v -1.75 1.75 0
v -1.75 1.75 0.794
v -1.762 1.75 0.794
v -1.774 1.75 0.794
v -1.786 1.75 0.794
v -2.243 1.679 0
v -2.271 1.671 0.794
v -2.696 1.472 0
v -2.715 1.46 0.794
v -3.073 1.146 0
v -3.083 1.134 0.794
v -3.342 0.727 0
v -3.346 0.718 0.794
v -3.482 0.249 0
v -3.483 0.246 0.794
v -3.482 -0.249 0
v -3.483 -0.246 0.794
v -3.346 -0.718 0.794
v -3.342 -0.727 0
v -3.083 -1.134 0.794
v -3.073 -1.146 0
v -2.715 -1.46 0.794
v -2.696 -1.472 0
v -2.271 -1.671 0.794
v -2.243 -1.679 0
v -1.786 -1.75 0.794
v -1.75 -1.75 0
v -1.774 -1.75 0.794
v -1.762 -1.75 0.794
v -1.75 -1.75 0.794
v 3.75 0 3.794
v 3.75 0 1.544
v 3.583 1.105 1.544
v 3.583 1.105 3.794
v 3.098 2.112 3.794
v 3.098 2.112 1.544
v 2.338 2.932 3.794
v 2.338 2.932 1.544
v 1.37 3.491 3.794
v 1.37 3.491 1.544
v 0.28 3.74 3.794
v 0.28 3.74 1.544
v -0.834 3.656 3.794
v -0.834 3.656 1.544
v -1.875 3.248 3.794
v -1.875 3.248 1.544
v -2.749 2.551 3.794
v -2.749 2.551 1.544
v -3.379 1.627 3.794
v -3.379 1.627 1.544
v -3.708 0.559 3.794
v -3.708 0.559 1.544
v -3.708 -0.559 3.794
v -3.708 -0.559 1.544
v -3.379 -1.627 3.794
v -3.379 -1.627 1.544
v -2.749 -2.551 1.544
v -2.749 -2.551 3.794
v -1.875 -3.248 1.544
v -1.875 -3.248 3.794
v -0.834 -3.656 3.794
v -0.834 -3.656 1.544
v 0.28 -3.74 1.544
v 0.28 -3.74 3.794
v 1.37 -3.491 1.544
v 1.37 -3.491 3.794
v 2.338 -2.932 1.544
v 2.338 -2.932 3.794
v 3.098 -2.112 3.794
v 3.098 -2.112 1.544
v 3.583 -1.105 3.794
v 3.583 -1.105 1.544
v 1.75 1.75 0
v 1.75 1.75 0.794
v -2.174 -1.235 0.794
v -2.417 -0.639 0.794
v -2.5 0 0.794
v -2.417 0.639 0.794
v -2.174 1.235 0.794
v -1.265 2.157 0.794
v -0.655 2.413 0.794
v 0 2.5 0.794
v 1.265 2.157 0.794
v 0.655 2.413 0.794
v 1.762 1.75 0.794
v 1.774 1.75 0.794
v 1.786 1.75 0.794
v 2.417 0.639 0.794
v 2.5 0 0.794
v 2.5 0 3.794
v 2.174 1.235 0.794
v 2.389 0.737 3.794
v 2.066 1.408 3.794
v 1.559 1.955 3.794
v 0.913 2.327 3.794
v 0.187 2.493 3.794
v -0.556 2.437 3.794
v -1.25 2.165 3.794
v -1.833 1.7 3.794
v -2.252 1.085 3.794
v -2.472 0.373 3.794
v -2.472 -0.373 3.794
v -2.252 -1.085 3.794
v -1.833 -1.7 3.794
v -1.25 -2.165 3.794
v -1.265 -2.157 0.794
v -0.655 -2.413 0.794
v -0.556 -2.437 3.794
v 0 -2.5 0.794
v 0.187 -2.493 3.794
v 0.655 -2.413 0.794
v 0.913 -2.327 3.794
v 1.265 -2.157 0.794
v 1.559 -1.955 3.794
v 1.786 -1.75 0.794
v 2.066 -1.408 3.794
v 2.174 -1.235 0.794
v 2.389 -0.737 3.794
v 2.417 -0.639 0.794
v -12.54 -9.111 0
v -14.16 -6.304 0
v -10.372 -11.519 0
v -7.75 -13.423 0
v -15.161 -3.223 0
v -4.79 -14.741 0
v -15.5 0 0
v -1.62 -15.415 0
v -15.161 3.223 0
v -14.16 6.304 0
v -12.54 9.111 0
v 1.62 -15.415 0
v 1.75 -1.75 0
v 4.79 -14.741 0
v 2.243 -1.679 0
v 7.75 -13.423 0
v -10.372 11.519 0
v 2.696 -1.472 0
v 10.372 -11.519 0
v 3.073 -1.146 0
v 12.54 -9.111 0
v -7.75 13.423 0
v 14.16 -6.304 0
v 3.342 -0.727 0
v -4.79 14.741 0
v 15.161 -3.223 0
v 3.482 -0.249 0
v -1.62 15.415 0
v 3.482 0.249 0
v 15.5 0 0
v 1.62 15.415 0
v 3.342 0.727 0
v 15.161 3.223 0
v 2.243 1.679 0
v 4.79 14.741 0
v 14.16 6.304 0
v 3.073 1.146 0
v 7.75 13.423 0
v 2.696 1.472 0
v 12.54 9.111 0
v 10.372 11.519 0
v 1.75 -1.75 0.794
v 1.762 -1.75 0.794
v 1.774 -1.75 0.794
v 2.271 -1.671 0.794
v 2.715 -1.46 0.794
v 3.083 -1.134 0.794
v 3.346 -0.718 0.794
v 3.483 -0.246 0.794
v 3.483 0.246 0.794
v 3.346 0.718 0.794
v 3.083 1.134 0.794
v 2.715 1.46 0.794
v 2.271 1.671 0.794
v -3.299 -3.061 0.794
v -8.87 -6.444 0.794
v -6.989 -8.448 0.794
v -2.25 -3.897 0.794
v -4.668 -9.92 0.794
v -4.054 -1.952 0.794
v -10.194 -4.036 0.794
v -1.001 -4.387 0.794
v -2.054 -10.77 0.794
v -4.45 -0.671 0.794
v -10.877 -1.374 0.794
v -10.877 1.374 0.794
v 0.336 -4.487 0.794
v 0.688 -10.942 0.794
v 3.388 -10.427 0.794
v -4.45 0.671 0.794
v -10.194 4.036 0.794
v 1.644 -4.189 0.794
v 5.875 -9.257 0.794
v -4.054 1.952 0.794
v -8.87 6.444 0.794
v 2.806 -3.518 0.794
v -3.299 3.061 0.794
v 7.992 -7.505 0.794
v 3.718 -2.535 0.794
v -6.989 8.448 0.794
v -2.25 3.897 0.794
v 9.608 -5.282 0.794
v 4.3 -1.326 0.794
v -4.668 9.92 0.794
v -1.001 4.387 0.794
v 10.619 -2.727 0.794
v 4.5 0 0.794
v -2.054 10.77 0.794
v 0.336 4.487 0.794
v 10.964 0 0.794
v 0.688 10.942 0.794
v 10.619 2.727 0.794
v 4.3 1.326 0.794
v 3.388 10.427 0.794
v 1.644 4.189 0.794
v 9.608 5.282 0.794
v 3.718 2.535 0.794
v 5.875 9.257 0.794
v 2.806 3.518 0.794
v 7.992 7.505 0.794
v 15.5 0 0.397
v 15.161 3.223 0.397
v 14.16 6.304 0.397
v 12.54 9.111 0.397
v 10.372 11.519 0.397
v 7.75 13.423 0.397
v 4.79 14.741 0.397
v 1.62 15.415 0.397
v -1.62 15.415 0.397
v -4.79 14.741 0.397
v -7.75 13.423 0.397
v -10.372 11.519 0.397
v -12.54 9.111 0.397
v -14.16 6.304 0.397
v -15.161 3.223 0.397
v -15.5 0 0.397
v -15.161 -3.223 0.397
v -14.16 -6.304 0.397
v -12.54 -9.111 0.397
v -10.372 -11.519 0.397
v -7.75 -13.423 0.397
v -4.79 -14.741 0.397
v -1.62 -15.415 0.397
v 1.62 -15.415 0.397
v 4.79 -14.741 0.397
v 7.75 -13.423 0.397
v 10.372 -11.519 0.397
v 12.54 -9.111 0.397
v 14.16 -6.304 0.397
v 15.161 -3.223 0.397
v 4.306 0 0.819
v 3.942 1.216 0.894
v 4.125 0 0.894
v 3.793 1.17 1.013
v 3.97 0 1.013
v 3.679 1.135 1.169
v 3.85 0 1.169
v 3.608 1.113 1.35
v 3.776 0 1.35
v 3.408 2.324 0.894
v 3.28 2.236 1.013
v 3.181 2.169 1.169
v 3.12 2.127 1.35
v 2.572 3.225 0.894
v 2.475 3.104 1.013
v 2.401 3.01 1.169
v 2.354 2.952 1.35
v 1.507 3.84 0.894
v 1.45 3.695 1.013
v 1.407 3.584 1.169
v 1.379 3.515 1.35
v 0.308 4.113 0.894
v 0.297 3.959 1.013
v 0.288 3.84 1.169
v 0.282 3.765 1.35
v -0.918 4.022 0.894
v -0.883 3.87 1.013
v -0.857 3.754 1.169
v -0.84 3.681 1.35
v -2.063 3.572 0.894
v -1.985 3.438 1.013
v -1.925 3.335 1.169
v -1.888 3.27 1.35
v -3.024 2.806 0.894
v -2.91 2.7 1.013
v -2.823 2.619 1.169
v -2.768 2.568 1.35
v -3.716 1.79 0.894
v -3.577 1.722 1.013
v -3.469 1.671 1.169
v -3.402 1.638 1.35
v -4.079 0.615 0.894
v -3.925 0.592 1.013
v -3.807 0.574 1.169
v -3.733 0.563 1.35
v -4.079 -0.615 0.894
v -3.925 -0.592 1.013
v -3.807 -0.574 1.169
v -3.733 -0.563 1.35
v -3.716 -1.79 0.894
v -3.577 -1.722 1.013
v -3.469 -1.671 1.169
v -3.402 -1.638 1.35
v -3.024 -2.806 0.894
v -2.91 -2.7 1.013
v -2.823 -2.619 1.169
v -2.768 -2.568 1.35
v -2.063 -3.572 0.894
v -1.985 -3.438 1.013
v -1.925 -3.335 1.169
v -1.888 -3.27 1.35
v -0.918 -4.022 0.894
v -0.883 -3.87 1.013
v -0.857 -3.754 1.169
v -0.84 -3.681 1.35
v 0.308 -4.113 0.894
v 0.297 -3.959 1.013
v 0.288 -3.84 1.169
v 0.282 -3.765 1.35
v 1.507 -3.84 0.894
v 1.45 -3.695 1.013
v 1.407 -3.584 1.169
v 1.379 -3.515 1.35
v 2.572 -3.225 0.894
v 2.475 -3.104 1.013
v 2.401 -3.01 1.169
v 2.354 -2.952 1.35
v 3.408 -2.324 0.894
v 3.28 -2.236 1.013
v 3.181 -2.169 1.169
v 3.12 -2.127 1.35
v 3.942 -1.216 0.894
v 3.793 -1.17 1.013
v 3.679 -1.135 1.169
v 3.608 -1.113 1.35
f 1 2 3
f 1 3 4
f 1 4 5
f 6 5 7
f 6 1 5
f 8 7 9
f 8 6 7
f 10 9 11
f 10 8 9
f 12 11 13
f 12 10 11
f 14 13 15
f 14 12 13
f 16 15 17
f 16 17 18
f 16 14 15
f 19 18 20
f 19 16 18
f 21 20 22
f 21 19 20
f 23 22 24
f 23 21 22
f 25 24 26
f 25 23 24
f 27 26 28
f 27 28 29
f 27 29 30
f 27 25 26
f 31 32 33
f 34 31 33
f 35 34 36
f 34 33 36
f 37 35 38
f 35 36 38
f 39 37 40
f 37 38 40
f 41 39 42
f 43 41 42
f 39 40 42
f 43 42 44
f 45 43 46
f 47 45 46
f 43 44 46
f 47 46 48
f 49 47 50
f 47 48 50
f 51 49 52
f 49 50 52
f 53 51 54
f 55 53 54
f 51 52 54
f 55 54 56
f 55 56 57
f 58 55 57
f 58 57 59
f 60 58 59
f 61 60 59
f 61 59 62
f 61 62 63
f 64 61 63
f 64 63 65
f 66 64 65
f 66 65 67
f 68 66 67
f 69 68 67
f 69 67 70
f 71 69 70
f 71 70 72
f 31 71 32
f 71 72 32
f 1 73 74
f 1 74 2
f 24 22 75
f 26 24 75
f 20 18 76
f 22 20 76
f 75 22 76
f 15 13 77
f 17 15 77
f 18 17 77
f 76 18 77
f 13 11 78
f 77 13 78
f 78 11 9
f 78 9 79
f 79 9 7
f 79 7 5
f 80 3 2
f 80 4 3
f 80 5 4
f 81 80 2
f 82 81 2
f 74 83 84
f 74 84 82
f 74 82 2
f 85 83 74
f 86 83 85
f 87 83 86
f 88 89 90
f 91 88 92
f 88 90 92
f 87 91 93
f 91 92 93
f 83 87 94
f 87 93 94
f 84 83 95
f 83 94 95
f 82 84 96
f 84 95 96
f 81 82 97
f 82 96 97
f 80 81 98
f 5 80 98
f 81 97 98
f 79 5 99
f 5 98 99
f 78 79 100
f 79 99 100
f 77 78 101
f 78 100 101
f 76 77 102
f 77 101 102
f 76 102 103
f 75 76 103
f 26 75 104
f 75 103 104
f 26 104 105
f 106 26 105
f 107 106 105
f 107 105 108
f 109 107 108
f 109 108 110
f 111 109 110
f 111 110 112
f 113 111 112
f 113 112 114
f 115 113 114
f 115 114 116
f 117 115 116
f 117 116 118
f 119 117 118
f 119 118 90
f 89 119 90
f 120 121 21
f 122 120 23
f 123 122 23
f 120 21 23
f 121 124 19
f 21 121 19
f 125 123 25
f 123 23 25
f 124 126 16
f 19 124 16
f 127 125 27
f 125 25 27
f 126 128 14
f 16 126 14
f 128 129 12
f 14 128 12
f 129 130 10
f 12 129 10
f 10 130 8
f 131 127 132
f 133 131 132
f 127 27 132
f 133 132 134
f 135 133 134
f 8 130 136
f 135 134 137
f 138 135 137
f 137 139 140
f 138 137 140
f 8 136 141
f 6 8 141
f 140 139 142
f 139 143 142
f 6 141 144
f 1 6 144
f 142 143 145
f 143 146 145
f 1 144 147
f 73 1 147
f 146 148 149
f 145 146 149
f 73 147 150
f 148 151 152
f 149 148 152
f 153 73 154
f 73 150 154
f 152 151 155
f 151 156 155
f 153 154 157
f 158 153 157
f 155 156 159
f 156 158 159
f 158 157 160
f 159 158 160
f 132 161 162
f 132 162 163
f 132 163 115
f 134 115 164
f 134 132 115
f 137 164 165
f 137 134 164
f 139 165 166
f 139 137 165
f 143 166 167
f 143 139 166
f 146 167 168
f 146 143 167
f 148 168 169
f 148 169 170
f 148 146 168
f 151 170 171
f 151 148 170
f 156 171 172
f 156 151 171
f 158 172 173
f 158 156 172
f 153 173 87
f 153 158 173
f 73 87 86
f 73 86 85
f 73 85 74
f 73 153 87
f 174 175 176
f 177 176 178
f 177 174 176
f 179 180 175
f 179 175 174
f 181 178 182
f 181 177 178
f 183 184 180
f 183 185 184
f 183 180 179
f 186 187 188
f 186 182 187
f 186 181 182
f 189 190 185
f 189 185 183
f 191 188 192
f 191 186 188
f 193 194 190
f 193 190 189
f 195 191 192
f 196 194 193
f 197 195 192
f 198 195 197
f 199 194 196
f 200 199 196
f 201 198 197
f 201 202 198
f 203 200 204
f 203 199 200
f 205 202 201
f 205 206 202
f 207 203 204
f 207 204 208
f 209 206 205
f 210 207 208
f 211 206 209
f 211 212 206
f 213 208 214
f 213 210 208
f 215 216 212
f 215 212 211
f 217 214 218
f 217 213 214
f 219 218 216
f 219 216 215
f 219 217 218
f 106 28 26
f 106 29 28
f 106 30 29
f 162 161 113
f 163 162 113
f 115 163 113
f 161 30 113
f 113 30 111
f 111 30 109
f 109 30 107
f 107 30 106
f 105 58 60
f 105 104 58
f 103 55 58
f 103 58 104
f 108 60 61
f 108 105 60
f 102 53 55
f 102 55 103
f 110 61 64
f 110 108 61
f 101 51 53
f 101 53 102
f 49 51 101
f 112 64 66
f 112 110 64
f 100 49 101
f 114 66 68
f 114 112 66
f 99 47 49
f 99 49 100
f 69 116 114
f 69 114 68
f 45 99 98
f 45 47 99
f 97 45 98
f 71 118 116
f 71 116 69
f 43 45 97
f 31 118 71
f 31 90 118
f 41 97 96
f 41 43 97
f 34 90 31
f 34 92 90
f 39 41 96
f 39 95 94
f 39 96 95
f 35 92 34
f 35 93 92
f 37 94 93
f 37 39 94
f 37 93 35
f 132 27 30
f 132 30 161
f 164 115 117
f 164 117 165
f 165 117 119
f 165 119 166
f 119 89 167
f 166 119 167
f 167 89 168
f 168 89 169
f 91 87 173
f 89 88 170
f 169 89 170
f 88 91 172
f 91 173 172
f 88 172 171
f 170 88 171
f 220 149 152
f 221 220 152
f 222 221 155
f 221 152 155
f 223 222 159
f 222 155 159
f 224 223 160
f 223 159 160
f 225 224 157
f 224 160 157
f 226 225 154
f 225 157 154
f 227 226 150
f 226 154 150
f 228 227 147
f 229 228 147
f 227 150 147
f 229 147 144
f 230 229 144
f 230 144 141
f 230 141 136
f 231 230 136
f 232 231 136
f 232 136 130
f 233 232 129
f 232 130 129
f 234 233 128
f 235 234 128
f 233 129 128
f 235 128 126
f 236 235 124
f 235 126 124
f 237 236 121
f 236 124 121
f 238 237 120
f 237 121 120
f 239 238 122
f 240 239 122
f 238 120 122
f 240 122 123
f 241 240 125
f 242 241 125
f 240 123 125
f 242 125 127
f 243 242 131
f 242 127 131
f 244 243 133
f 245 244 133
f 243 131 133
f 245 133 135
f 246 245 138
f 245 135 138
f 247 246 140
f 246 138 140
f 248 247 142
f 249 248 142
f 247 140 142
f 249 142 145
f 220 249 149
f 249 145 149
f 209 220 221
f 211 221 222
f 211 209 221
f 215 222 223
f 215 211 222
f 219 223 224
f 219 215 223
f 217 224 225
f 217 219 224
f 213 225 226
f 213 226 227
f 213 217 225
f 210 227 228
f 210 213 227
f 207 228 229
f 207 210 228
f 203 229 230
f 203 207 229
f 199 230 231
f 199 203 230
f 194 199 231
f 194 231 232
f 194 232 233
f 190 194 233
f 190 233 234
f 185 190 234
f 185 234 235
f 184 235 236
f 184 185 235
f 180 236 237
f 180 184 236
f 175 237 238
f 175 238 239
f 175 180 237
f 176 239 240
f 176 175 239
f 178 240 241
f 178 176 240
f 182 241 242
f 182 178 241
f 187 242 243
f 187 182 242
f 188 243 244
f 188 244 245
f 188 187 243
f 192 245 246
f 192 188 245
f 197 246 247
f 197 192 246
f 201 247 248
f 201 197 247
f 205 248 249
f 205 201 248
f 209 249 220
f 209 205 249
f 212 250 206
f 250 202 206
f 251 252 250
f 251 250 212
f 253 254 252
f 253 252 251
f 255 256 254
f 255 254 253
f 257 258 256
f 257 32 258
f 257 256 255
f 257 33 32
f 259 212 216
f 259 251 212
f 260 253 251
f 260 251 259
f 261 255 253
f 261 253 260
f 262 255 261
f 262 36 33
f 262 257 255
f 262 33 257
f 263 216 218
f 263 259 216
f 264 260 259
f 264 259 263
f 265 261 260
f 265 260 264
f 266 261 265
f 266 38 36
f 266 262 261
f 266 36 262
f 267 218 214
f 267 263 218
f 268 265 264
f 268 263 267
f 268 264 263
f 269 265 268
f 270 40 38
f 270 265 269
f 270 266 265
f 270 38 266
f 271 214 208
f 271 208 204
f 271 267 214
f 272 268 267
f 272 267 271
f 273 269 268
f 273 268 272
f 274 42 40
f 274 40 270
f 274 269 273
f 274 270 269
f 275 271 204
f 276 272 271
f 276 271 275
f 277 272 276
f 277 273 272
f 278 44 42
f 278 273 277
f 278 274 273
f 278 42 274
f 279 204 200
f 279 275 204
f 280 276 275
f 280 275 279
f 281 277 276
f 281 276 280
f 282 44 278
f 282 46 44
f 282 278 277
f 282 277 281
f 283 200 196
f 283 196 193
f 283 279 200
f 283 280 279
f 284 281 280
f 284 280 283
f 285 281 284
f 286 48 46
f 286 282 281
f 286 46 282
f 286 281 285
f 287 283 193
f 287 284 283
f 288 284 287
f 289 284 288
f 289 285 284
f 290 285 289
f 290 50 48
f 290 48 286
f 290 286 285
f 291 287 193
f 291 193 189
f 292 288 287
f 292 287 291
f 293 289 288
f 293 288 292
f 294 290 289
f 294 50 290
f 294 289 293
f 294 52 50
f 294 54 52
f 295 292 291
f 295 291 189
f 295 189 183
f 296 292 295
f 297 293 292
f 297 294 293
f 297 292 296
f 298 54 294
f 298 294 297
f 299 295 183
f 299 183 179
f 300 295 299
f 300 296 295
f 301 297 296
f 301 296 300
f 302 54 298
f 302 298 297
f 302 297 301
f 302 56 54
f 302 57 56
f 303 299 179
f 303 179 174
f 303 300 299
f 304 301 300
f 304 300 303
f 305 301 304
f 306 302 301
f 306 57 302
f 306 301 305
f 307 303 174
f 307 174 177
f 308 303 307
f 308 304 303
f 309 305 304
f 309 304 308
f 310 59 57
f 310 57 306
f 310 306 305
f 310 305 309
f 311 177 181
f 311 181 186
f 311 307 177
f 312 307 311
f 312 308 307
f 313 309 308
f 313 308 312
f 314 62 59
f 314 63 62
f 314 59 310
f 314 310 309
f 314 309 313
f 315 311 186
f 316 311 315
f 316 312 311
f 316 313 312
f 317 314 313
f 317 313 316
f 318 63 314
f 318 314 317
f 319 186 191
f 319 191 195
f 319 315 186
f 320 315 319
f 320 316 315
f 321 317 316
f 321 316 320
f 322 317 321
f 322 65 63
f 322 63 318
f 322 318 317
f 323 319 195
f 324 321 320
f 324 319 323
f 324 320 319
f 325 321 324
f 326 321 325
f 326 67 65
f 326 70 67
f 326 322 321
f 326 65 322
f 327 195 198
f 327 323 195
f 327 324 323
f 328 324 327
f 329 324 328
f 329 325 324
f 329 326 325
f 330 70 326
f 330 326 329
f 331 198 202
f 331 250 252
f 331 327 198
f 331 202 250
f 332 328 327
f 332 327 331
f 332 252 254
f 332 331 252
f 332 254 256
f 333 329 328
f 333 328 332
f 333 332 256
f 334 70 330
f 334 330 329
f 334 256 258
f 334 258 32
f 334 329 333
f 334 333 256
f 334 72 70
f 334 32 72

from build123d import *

# Parameters (mm, degrees)
SKETCH1_R           = 15.5
BOSS_EXTRUDE1_DEPTH = 0.396875
SKETCH2_R           = 15.5
BOSS_EXTRUDE2_DEPTH = 0.396875
BOSS_EXTRUDE2_TAPER = 85
SKETCH3_R           = 3.75
BOSS_EXTRUDE3_DEPTH = 3
FILLET1_R           = 0.75
CUT_EXTRUDE1_DEPTH  = 0.79375
SKETCH5_R           = 2.5
CUT_EXTRUDE2_DEPTH  = 3


with BuildPart() as part:
    # Sketch1 → Boss-Extrude1 (new body)
    with BuildSketch(Plane.XY):
        Circle(SKETCH1_R)
    extrude(amount=BOSS_EXTRUDE1_DEPTH)

    # Sketch2 → Boss-Extrude2 (add)
    with BuildSketch(Plane.XY.offset(0.396875)):
        Circle(SKETCH2_R)
    extrude(amount=BOSS_EXTRUDE2_DEPTH, taper=BOSS_EXTRUDE2_TAPER)

    # Sketch3 → Boss-Extrude3 (add)
    with BuildSketch(Plane.XY.offset(0.79375)):
        Circle(SKETCH3_R)
    extrude(amount=BOSS_EXTRUDE3_DEPTH)

    # Fillet1
    fillet1_edges = [part.edges().sort_by_distance(p)[0] for p in [
        (-3.75, 0, 0.79375),
    ]]
    fillet(fillet1_edges, radius=FILLET1_R)

    # Sketch4 → Cut-Extrude1 (cut)
    with BuildSketch(Plane(origin=(0, 0, 0), x_dir=(-1, 0, 0), z_dir=(0, 0, -1))):
        with BuildLine():
            Line((-1.75, 1.75), (1.75, 1.75))
            ThreePointArc((1.75, 1.75), (3.5, 0), (1.75, -1.75))
            Line((1.75, -1.75), (-1.75, -1.75))
            ThreePointArc((-1.75, -1.75), (-3.5, 0), (-1.75, 1.75))
        make_face()
    extrude(amount=-CUT_EXTRUDE1_DEPTH, mode=Mode.SUBTRACT)

    # Sketch5 → Cut-Extrude2 (cut)
    with BuildSketch(Plane.XY.offset(3.79375)):
        Circle(SKETCH5_R)
    extrude(amount=-CUT_EXTRUDE2_DEPTH, mode=Mode.SUBTRACT)


solid = part.part
